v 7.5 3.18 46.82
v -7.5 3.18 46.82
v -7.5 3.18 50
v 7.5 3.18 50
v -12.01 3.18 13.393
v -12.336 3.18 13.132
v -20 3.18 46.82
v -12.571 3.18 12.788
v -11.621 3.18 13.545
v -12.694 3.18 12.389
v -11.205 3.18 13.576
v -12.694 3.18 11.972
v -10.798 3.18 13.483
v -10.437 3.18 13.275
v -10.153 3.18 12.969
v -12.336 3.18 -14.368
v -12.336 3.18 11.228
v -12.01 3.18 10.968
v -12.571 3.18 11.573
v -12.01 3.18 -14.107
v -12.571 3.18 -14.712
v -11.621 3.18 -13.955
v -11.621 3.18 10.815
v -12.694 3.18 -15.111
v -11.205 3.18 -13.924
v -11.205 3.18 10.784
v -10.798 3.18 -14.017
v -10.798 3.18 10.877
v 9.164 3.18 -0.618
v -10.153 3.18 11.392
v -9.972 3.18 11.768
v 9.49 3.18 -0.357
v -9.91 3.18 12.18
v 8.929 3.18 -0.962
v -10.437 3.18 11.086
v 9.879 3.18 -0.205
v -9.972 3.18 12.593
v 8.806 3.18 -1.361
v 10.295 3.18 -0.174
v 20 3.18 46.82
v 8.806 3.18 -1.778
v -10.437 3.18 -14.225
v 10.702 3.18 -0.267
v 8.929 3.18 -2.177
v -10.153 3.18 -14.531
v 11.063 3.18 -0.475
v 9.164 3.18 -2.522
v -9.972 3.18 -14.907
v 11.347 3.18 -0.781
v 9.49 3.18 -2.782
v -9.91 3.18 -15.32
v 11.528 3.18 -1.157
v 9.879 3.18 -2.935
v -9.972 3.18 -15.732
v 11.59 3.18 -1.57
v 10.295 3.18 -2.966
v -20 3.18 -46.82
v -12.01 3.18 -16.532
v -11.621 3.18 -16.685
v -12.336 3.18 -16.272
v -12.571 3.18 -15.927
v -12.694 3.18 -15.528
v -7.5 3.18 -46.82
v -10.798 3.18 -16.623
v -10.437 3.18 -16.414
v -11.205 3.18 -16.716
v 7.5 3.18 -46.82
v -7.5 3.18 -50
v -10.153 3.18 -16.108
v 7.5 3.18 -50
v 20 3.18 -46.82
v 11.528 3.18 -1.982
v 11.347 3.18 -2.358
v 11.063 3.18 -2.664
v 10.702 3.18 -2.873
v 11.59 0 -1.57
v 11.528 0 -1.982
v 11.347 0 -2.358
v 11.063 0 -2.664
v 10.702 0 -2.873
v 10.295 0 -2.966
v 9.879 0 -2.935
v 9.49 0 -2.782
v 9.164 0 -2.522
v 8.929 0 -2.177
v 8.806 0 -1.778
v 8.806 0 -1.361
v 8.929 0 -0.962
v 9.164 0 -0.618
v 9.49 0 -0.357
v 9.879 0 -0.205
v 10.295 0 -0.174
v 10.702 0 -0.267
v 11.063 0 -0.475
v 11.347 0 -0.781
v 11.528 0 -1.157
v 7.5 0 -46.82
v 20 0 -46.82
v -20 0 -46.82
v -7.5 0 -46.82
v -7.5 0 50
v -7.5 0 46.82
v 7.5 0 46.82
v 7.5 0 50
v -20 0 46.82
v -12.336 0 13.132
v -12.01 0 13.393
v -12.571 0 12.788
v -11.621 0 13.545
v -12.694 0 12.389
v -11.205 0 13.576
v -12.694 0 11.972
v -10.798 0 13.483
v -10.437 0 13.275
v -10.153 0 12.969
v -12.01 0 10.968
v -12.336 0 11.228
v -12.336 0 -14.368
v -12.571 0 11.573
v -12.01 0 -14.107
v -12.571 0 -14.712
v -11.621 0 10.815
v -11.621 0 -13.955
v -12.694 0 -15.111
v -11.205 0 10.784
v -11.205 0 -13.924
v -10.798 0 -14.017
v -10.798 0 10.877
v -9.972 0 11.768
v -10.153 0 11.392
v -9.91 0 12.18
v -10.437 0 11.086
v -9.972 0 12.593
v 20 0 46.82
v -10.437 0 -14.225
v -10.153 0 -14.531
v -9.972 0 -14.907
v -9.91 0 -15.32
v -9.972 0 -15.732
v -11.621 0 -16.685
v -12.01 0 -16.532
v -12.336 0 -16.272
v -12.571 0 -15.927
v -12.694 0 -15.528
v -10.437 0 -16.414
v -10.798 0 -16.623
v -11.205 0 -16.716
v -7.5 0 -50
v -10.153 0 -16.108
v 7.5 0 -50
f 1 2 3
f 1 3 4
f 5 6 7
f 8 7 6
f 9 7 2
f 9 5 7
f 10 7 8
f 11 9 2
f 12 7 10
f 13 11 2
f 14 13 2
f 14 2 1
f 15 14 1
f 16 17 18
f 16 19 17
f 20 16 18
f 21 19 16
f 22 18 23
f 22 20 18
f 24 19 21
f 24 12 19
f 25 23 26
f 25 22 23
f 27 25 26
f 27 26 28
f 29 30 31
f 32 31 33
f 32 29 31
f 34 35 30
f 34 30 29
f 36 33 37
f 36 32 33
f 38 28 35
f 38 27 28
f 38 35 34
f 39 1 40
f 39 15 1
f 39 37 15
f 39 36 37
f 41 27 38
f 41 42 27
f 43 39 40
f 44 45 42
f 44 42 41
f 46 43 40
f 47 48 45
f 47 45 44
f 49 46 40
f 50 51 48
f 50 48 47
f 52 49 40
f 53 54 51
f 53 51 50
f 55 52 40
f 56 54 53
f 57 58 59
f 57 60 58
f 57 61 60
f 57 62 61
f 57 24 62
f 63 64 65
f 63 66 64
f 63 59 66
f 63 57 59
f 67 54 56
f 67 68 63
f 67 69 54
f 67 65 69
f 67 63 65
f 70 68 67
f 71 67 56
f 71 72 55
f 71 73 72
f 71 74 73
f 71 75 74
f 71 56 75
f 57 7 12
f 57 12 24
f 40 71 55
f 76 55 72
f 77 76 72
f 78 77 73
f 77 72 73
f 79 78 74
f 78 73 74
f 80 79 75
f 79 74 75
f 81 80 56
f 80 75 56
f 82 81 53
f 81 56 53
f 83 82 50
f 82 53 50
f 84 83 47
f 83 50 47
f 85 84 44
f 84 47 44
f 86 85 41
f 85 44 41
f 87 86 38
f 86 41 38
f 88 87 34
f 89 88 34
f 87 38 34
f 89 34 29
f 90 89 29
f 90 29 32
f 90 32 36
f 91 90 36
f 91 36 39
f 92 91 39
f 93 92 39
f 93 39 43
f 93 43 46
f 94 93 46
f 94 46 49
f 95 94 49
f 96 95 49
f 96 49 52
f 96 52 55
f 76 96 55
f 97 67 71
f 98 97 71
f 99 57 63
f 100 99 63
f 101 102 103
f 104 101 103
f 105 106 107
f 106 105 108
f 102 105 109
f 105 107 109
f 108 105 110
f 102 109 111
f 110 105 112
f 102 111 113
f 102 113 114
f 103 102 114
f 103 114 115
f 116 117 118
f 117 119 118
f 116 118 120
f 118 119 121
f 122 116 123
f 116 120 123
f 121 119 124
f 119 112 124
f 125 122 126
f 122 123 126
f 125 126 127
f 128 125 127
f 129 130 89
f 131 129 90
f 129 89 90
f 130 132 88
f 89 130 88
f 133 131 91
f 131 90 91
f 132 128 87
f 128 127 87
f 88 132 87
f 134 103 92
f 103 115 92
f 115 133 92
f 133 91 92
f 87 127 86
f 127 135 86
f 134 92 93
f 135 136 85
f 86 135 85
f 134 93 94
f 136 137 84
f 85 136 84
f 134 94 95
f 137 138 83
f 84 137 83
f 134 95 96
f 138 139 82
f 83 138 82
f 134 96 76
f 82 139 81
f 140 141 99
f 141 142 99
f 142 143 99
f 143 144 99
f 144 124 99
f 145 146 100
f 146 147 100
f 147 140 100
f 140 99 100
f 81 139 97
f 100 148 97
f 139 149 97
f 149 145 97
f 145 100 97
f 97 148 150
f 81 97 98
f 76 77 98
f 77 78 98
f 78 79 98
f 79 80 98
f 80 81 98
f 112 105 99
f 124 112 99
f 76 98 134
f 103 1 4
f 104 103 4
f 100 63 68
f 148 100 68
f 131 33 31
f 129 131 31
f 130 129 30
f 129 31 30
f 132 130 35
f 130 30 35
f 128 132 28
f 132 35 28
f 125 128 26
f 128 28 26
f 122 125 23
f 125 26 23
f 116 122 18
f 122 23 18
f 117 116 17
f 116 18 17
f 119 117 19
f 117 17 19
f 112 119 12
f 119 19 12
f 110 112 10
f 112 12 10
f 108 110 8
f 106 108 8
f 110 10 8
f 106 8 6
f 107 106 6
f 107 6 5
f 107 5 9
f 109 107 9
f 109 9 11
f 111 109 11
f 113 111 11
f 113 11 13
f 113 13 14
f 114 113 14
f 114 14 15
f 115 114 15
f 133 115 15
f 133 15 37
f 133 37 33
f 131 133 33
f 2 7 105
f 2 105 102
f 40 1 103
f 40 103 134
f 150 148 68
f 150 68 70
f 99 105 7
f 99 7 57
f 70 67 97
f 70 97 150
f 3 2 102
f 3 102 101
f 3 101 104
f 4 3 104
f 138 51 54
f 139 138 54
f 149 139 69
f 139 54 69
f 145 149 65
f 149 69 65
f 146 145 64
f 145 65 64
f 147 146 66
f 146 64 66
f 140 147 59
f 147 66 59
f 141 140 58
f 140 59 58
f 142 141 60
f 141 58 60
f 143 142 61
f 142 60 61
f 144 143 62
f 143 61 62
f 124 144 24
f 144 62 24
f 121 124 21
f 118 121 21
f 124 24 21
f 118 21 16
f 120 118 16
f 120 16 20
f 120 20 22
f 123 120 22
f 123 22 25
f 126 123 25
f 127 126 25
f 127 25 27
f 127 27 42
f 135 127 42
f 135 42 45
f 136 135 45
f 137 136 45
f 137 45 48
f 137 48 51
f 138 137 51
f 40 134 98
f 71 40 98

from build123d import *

# Parameters (mm, degrees)
SKETCH1_W           = 40
SKETCH1_H           = 100
BOSS_EXTRUDE1_DEPTH = 3.18
SKETCH2_W           = 12.5
SKETCH2_H           = 3.18
CUT_EXTRUDE1_DEPTH  = 4.18
SKETCH3_R           = 1.4
CUT_EXTRUDE2_DEPTH  = 4.18


with BuildPart() as part:
    # Sketch1 → Boss-Extrude1 (new body)
    with BuildSketch(Plane(origin=(0, 0, 0), x_dir=(1, 0, 0), z_dir=(0, 1, 0))):
        Rectangle(SKETCH1_W, SKETCH1_H)
    extrude(amount=BOSS_EXTRUDE1_DEPTH)

    # Sketch2 → Cut-Extrude1 (cut, through all)
    with BuildSketch(Plane(origin=(0, 3.18, 0), x_dir=(1, 0, 0), z_dir=(0, 1, 0))):
        with Locations((13.75, 48.41)):
            Rectangle(SKETCH2_W, SKETCH2_H)
        with Locations((-13.75, 48.41)):
            Rectangle(SKETCH2_W, SKETCH2_H)
    cut_extrude1 = extrude(amount=-CUT_EXTRUDE1_DEPTH, mode=Mode.SUBTRACT)

    # Mirror1: Cut-Extrude1 across plane
    add(cut_extrude1.mirror(Plane.XY), mode=Mode.SUBTRACT)

    # Sketch3 → Cut-Extrude2 (cut, through all)
    with BuildSketch(Plane(origin=(0, 3.18, 0), x_dir=(1, 0, 0), z_dir=(0, 1, 0))):
        with Locations((-11.309610499, -12.180202037)):
            Circle(SKETCH3_R)
        with Locations((10.190389501, 1.569797963)):
            Circle(SKETCH3_R)
        with Locations((-11.309610499, 15.319797963)):
            Circle(SKETCH3_R)
    extrude(amount=-CUT_EXTRUDE2_DEPTH, mode=Mode.SUBTRACT)


solid = part.part
